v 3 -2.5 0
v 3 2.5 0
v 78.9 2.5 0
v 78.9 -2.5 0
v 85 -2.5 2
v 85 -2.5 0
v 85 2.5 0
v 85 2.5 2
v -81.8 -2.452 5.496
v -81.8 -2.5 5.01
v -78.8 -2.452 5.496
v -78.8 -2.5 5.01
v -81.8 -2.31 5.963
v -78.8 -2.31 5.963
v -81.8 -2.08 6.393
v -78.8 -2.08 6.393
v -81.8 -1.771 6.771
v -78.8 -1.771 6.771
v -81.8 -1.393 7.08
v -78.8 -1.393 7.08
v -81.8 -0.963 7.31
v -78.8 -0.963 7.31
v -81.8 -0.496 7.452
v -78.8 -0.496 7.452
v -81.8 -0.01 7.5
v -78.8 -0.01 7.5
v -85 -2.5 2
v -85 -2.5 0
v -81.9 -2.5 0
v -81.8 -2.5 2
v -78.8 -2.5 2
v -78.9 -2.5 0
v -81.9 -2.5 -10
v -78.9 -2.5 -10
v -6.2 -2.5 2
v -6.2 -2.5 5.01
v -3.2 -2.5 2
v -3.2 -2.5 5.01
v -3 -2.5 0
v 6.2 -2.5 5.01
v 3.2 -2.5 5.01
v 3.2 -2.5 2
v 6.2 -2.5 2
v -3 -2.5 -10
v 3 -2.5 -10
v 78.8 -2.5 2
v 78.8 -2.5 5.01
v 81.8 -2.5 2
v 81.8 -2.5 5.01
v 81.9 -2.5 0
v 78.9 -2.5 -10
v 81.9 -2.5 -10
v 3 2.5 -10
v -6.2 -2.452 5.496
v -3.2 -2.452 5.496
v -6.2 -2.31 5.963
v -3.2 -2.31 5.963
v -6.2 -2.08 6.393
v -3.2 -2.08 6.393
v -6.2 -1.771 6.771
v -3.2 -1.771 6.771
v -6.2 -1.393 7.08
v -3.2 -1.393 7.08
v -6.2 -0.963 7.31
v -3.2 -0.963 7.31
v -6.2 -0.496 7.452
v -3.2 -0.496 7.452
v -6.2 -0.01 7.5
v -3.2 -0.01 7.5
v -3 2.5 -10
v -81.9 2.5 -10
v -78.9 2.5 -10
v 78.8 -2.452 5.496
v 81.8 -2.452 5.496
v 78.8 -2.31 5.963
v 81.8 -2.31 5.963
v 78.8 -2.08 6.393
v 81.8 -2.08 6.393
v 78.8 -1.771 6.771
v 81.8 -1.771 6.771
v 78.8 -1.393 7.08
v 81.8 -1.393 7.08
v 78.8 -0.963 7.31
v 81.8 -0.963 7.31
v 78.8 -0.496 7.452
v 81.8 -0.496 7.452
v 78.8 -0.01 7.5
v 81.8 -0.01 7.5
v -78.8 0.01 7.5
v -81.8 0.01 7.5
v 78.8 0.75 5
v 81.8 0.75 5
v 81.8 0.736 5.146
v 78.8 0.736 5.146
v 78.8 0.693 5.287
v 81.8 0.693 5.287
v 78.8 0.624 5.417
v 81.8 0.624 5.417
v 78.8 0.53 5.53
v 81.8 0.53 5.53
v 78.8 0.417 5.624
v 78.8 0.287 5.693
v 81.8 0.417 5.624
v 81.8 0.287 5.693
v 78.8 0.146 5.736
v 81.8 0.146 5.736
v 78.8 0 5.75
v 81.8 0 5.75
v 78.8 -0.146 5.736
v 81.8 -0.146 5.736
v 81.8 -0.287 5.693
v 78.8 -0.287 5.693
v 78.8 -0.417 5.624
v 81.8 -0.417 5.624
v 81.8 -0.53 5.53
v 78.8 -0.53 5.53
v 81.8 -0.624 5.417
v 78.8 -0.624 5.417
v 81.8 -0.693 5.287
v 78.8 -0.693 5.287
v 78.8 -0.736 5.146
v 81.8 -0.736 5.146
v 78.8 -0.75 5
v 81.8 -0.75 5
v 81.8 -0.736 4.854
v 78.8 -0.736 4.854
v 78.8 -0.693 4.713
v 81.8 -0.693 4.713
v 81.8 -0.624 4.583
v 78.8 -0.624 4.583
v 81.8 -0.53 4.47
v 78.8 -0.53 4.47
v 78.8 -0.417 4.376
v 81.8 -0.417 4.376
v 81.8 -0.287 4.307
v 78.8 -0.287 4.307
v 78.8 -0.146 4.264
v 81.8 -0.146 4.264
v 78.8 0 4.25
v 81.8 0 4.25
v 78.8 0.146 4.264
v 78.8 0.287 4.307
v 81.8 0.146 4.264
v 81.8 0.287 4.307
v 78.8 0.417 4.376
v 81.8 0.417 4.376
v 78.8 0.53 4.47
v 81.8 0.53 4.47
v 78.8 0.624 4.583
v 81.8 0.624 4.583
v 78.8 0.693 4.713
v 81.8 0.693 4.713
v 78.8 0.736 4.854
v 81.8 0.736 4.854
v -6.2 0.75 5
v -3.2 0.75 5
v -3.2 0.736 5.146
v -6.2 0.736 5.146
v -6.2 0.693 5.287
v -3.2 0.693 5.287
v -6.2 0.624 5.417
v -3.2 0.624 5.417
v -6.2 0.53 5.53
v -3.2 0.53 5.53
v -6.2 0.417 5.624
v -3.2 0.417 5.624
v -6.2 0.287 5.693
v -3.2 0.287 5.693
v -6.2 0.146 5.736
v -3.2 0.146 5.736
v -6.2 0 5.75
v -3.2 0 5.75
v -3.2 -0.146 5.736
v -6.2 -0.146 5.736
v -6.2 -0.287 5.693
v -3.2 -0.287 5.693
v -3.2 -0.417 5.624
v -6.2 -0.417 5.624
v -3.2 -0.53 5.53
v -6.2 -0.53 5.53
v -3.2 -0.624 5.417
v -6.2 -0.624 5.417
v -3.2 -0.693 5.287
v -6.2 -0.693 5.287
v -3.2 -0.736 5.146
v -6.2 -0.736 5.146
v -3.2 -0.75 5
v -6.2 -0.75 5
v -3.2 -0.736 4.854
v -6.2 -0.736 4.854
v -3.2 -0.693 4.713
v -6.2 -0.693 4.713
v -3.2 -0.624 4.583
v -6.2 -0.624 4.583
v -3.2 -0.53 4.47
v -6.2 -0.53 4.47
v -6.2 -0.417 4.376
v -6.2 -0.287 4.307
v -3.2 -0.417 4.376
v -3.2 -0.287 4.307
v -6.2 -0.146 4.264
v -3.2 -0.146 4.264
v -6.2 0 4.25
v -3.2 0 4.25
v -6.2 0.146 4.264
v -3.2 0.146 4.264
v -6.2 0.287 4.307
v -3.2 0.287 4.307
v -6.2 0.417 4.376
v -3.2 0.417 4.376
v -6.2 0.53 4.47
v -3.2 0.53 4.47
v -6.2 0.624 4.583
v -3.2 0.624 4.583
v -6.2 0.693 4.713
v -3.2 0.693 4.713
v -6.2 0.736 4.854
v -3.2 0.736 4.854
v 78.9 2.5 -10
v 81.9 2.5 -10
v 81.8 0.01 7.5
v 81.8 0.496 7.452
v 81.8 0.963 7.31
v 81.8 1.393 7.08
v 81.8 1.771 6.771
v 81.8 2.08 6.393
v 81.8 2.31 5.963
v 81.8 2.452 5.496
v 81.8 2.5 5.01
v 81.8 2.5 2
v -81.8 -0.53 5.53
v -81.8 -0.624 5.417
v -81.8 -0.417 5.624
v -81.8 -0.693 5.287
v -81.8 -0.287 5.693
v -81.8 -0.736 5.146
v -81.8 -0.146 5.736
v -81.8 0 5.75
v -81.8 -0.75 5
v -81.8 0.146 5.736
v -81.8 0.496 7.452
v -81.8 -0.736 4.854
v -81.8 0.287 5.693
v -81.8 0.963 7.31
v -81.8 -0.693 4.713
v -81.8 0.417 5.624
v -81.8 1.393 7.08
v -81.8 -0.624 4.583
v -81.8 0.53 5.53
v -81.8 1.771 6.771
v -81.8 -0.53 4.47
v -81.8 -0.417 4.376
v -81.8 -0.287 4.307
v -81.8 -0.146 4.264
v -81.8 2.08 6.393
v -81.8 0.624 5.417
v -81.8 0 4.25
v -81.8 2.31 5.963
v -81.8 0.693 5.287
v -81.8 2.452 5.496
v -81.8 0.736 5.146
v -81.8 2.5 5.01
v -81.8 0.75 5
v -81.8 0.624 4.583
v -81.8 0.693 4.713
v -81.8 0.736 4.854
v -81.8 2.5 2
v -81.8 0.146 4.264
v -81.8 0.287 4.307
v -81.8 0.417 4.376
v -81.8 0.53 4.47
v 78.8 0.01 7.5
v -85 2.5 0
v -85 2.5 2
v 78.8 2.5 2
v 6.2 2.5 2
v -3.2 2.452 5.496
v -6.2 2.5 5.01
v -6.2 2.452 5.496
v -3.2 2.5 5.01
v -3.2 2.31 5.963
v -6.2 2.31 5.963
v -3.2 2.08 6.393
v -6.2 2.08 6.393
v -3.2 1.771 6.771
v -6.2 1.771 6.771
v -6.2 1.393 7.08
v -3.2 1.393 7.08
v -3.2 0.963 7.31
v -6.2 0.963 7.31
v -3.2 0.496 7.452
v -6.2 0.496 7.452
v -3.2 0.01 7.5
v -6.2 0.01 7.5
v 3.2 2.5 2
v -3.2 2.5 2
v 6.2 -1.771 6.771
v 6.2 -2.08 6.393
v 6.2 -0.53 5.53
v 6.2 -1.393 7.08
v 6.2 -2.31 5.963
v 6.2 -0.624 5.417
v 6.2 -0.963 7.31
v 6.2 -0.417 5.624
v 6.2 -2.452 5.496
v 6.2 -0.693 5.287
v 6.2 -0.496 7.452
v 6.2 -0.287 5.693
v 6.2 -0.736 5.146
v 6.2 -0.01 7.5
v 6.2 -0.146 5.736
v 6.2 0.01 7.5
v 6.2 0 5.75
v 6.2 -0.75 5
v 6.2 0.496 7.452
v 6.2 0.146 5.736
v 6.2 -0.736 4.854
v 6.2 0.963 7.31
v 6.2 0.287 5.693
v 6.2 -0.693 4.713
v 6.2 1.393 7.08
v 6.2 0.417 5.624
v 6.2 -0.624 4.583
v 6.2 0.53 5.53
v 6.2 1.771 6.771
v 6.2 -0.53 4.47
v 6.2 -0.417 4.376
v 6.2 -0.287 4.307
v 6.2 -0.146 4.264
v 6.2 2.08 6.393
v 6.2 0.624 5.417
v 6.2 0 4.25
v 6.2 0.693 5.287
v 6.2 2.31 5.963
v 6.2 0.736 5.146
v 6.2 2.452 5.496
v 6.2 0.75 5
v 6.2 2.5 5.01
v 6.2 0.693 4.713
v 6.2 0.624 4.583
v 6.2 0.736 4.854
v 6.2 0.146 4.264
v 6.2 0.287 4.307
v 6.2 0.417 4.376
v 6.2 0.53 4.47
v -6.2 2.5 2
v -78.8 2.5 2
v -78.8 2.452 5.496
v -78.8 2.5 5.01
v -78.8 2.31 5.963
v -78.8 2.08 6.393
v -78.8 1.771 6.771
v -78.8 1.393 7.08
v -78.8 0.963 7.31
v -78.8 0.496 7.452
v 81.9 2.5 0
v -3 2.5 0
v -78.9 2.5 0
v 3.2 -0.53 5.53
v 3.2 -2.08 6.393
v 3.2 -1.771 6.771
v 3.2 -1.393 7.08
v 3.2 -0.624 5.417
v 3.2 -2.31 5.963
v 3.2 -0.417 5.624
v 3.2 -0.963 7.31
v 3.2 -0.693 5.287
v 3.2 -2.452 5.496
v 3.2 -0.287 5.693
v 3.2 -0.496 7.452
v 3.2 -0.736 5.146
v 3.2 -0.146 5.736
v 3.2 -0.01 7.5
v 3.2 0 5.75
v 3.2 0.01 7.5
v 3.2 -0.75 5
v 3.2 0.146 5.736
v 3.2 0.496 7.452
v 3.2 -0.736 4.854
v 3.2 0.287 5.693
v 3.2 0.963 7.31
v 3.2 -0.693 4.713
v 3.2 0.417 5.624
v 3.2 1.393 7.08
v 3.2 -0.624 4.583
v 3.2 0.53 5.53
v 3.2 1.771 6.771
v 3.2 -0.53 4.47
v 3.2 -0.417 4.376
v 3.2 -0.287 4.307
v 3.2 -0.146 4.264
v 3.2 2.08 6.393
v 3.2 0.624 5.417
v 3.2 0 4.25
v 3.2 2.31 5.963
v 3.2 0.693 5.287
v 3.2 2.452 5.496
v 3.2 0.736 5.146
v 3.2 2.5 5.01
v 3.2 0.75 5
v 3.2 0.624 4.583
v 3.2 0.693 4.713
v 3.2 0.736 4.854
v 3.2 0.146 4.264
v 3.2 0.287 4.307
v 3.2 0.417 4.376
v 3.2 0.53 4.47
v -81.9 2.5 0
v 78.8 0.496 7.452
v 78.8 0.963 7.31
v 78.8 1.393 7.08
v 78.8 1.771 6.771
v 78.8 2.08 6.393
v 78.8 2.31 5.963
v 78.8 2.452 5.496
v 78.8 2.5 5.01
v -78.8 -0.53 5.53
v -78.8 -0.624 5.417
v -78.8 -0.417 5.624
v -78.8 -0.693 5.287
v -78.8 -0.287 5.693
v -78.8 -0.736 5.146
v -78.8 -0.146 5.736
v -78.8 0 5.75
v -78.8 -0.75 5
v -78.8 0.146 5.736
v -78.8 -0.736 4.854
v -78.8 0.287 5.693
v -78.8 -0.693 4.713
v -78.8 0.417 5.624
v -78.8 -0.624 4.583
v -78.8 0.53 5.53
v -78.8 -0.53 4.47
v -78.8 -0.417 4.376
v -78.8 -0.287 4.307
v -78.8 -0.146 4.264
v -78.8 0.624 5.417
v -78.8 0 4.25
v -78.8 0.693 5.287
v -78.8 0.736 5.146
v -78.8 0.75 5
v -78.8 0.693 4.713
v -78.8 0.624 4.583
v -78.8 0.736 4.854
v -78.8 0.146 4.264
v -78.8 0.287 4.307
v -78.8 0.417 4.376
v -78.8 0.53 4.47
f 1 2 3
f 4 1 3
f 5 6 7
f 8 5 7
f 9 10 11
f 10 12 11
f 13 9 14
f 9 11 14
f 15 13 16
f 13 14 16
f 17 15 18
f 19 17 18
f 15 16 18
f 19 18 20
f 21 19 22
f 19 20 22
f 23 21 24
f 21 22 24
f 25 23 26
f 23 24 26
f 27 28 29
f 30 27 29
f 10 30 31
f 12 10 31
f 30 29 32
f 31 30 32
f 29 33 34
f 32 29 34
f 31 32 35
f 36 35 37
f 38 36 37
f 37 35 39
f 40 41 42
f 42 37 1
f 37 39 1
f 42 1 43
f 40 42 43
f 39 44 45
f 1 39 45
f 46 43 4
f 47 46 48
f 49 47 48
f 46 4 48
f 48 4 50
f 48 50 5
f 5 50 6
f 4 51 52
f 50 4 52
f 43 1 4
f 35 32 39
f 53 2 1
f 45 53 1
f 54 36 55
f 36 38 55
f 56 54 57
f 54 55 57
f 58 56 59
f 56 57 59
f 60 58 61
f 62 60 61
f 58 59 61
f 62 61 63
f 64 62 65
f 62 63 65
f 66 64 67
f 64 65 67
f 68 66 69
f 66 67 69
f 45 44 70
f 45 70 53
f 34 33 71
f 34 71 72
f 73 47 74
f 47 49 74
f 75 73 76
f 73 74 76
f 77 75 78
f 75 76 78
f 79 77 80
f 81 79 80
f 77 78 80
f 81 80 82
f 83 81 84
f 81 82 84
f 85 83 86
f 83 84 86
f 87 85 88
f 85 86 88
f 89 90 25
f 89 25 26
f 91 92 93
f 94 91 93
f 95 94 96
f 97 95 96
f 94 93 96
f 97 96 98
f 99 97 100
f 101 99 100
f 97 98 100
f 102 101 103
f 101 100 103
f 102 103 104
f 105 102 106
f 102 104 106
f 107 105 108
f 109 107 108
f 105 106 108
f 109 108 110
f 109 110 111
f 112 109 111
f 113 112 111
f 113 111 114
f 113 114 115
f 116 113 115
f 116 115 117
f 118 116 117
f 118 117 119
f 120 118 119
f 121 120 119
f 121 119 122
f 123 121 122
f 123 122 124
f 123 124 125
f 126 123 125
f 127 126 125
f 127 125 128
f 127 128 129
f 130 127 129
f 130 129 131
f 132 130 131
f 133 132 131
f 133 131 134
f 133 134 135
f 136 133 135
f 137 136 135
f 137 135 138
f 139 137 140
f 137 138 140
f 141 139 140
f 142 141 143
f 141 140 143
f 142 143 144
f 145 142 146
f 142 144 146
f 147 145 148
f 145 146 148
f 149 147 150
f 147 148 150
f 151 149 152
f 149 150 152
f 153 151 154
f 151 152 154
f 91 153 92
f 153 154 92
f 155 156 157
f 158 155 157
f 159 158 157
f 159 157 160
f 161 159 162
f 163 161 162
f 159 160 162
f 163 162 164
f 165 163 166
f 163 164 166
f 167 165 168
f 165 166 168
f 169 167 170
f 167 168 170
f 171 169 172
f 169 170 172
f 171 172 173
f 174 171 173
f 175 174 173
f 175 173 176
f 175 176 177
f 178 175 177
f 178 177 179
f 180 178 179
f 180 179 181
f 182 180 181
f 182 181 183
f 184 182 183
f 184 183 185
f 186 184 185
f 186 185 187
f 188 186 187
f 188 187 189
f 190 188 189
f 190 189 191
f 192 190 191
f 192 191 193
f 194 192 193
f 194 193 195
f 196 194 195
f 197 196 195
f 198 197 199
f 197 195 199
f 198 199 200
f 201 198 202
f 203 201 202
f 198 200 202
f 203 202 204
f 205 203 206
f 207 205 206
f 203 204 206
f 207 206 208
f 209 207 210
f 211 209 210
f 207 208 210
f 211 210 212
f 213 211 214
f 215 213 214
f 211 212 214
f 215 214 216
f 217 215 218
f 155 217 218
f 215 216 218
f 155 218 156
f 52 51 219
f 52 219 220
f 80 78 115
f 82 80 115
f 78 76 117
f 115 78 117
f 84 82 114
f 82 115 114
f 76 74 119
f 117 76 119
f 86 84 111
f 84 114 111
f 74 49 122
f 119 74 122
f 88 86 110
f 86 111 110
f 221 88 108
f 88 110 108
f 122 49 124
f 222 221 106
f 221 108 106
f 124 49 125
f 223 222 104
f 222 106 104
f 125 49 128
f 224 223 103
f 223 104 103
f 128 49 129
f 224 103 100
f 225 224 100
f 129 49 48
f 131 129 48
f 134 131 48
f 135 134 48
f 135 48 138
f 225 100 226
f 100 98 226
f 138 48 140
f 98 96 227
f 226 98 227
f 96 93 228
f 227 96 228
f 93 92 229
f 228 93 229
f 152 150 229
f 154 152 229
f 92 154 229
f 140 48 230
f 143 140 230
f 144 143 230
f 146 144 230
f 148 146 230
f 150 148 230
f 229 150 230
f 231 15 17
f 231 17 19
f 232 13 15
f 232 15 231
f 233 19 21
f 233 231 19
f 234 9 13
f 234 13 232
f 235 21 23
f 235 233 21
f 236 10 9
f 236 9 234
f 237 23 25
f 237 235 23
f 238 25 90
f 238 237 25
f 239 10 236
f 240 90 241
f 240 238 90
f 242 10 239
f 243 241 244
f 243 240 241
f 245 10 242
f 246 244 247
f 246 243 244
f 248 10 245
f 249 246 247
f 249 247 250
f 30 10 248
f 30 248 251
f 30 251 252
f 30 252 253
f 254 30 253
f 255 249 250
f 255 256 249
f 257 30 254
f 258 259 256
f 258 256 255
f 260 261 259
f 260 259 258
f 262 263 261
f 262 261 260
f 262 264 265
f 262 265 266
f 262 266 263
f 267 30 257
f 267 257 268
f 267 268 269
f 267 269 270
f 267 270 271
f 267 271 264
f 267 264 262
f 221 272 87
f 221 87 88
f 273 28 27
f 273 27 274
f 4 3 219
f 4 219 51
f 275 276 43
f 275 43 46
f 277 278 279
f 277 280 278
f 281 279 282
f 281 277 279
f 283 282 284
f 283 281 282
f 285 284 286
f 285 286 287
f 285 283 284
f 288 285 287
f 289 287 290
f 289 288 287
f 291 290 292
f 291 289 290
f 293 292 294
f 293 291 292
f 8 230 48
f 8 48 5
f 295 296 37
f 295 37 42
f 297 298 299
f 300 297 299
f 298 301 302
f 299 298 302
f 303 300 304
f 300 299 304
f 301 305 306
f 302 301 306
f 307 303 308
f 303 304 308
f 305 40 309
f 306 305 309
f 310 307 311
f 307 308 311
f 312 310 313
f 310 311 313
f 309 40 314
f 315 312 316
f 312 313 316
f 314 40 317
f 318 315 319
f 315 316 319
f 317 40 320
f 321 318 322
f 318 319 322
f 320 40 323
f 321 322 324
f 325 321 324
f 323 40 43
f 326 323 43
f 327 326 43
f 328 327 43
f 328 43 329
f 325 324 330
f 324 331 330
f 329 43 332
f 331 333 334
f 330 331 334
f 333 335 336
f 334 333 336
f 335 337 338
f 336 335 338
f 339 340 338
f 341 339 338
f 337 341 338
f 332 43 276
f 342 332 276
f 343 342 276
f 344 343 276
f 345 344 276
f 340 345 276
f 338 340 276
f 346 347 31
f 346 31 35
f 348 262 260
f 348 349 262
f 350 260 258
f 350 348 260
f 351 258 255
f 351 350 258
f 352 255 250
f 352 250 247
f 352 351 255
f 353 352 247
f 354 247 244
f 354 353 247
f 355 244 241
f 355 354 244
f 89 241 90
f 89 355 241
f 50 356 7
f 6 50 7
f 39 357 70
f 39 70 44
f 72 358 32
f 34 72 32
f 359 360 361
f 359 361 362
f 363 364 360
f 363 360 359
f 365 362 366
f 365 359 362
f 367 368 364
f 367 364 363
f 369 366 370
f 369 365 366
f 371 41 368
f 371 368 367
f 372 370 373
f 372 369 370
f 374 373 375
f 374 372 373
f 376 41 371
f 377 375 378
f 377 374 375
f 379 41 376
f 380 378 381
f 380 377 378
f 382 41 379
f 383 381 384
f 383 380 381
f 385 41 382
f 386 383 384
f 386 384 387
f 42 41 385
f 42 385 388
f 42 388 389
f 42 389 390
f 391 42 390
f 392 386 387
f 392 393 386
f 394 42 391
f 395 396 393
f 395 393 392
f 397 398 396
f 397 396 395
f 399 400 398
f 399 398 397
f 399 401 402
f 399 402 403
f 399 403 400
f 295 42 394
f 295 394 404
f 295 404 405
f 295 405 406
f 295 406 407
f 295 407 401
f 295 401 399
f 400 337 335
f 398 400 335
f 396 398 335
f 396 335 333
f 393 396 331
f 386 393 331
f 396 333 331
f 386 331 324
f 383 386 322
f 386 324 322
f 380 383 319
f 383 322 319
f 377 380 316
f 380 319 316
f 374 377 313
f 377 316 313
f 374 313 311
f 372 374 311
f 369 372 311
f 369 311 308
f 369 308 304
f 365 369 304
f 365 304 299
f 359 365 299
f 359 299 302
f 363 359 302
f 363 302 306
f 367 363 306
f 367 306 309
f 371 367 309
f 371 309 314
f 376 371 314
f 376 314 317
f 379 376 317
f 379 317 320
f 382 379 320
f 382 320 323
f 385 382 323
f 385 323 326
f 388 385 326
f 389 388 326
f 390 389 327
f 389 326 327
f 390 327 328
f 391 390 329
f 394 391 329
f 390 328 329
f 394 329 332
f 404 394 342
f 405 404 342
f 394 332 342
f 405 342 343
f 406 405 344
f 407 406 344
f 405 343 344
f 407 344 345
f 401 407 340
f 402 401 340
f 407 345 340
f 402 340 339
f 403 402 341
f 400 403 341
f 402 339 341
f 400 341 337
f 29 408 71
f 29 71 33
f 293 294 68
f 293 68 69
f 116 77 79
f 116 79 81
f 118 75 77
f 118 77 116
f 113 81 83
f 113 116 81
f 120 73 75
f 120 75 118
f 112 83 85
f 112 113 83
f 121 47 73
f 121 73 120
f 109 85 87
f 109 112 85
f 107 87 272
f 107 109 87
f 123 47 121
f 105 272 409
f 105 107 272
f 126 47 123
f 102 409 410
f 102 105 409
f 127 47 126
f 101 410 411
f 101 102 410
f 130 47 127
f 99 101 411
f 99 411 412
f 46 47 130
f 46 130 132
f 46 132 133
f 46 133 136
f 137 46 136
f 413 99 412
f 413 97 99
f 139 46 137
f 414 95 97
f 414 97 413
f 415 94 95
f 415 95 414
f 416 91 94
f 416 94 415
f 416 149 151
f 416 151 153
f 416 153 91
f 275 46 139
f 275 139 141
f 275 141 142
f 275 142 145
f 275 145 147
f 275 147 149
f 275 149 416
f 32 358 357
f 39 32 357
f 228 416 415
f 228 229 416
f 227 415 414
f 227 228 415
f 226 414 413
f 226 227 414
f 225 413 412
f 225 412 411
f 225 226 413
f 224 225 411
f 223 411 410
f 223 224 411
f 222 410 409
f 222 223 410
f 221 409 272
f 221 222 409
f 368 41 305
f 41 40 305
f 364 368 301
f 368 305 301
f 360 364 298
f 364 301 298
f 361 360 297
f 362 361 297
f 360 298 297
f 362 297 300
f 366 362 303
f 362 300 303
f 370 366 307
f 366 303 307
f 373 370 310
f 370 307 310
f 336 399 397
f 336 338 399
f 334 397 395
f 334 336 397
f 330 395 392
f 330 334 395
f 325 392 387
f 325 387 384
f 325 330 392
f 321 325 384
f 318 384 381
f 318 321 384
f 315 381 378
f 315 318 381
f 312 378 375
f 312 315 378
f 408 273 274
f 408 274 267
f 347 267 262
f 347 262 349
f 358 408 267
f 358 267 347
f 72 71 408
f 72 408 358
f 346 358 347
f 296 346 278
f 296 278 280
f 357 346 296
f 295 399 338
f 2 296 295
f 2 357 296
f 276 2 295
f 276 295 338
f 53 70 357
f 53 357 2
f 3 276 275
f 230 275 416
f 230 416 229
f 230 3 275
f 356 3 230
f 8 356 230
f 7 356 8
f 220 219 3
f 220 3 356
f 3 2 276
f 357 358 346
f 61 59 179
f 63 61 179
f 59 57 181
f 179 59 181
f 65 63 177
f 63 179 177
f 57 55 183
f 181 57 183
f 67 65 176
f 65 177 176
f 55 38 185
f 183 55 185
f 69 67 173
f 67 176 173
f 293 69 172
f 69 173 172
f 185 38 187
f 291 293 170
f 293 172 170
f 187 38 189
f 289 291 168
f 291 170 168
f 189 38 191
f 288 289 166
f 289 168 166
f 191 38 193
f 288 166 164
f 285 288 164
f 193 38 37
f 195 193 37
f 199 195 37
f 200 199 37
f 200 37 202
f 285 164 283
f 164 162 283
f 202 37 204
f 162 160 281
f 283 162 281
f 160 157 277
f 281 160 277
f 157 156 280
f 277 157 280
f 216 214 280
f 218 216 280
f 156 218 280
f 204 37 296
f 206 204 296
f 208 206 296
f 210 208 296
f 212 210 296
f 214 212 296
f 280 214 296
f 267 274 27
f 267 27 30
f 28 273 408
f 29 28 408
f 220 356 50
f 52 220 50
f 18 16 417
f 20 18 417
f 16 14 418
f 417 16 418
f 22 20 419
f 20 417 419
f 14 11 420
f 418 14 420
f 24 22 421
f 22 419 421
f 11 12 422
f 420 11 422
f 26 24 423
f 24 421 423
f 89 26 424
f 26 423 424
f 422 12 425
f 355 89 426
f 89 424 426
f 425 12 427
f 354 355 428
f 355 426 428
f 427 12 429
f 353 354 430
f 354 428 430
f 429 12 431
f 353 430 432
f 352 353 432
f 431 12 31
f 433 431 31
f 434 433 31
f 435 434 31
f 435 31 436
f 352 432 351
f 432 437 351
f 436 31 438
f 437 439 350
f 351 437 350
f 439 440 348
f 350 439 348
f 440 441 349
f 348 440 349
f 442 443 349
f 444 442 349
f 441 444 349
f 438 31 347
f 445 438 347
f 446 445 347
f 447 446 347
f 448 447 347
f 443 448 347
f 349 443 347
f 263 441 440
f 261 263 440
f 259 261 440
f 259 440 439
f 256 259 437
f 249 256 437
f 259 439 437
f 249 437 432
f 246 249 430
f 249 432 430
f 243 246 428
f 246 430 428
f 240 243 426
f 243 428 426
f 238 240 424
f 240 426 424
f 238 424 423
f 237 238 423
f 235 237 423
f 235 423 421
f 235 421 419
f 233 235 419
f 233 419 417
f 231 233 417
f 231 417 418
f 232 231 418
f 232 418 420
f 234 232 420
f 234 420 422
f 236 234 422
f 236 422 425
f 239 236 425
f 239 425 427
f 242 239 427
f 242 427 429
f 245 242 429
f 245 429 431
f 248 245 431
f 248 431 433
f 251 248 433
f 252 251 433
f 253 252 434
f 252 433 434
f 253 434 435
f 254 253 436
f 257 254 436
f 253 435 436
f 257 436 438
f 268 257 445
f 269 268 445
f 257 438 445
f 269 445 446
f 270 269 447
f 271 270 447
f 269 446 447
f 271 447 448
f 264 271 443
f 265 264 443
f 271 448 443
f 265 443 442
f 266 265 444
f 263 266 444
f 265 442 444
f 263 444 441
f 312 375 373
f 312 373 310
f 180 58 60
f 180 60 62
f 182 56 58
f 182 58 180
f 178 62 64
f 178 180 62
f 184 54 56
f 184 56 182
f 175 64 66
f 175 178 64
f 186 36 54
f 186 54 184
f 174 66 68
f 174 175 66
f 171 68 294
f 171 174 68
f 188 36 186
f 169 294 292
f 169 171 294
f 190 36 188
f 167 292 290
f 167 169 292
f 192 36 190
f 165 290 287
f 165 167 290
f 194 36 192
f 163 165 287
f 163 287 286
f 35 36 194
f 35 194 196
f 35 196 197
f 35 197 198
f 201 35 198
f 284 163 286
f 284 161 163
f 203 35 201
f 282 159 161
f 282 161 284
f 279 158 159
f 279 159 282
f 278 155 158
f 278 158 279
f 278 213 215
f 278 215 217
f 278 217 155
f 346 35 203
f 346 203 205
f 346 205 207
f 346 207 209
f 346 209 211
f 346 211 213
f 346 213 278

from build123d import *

# Parameters (mm, degrees)
SKETCH_W      = 170
SKETCH_H      = 5
PAD_DEPTH     = 2
SKETCH001_W   = 3
SKETCH001_H   = 5
PAD001_DEPTH  = 5.5
FILLET_R      = 2.49
SKETCH002_R   = 0.75
POCKET_DEPTH  = 200
SKETCH003_W   = 3
SKETCH003_H   = 5
SKETCH003_W_2 = 6
PAD002_DEPTH  = 10


with BuildPart() as part:
    # Sketch → Pad (new body)
    with BuildSketch(Plane.XY):
        Rectangle(SKETCH_W, SKETCH_H)
    extrude(amount=PAD_DEPTH)

    # Sketch001 (on Face6 of Pad) → Pad001 (join)
    with BuildSketch(Plane.XY.offset(2)):
        with Locations((-80.3, 0)):
            Rectangle(SKETCH001_W, SKETCH001_H)
        with Locations((80.3, 0)):
            Rectangle(SKETCH001_W, SKETCH001_H)
        with Locations((-4.7, 0)):
            Rectangle(SKETCH001_W, SKETCH001_H)
        with Locations((4.7, 0)):
            Rectangle(SKETCH001_W, SKETCH001_H)
    extrude(amount=PAD001_DEPTH)

    # Fillet
    fillet_edges = [part.edges().sort_by_distance(p)[0] for p in [
        (-80.3, -2.5, 7.5),
        (-4.7, -2.5, 7.5),
        (4.7, -2.5, 7.5),
        (80.3, -2.5, 7.5),
        (80.3, 2.5, 7.5),
        (4.7, 2.5, 7.5),
        (-4.7, 2.5, 7.5),
        (-80.3, 2.5, 7.5),
    ]]
    fillet(fillet_edges, radius=FILLET_R)

    # Sketch002 (on Face29 of Fillet) → Pocket (cut)
    with BuildSketch(Plane.YZ.offset(81.8)):
        with Locations((0, 5)):
            Circle(SKETCH002_R)
    extrude(amount=-POCKET_DEPTH, mode=Mode.SUBTRACT)

    # Sketch003 (on Face13 of Pocket) → Pad002 (join)
    with BuildSketch(Plane(origin=(0, 0, 0), x_dir=(1, 0, 0), z_dir=(0, 0, -1))):
        with Locations((-80.4, 0)):
            Rectangle(SKETCH003_W, SKETCH003_H)
        Rectangle(SKETCH003_W_2, SKETCH003_H)
        with Locations((80.4, 0)):
            Rectangle(SKETCH003_W, SKETCH003_H)
    extrude(amount=PAD002_DEPTH)


solid = part.part
